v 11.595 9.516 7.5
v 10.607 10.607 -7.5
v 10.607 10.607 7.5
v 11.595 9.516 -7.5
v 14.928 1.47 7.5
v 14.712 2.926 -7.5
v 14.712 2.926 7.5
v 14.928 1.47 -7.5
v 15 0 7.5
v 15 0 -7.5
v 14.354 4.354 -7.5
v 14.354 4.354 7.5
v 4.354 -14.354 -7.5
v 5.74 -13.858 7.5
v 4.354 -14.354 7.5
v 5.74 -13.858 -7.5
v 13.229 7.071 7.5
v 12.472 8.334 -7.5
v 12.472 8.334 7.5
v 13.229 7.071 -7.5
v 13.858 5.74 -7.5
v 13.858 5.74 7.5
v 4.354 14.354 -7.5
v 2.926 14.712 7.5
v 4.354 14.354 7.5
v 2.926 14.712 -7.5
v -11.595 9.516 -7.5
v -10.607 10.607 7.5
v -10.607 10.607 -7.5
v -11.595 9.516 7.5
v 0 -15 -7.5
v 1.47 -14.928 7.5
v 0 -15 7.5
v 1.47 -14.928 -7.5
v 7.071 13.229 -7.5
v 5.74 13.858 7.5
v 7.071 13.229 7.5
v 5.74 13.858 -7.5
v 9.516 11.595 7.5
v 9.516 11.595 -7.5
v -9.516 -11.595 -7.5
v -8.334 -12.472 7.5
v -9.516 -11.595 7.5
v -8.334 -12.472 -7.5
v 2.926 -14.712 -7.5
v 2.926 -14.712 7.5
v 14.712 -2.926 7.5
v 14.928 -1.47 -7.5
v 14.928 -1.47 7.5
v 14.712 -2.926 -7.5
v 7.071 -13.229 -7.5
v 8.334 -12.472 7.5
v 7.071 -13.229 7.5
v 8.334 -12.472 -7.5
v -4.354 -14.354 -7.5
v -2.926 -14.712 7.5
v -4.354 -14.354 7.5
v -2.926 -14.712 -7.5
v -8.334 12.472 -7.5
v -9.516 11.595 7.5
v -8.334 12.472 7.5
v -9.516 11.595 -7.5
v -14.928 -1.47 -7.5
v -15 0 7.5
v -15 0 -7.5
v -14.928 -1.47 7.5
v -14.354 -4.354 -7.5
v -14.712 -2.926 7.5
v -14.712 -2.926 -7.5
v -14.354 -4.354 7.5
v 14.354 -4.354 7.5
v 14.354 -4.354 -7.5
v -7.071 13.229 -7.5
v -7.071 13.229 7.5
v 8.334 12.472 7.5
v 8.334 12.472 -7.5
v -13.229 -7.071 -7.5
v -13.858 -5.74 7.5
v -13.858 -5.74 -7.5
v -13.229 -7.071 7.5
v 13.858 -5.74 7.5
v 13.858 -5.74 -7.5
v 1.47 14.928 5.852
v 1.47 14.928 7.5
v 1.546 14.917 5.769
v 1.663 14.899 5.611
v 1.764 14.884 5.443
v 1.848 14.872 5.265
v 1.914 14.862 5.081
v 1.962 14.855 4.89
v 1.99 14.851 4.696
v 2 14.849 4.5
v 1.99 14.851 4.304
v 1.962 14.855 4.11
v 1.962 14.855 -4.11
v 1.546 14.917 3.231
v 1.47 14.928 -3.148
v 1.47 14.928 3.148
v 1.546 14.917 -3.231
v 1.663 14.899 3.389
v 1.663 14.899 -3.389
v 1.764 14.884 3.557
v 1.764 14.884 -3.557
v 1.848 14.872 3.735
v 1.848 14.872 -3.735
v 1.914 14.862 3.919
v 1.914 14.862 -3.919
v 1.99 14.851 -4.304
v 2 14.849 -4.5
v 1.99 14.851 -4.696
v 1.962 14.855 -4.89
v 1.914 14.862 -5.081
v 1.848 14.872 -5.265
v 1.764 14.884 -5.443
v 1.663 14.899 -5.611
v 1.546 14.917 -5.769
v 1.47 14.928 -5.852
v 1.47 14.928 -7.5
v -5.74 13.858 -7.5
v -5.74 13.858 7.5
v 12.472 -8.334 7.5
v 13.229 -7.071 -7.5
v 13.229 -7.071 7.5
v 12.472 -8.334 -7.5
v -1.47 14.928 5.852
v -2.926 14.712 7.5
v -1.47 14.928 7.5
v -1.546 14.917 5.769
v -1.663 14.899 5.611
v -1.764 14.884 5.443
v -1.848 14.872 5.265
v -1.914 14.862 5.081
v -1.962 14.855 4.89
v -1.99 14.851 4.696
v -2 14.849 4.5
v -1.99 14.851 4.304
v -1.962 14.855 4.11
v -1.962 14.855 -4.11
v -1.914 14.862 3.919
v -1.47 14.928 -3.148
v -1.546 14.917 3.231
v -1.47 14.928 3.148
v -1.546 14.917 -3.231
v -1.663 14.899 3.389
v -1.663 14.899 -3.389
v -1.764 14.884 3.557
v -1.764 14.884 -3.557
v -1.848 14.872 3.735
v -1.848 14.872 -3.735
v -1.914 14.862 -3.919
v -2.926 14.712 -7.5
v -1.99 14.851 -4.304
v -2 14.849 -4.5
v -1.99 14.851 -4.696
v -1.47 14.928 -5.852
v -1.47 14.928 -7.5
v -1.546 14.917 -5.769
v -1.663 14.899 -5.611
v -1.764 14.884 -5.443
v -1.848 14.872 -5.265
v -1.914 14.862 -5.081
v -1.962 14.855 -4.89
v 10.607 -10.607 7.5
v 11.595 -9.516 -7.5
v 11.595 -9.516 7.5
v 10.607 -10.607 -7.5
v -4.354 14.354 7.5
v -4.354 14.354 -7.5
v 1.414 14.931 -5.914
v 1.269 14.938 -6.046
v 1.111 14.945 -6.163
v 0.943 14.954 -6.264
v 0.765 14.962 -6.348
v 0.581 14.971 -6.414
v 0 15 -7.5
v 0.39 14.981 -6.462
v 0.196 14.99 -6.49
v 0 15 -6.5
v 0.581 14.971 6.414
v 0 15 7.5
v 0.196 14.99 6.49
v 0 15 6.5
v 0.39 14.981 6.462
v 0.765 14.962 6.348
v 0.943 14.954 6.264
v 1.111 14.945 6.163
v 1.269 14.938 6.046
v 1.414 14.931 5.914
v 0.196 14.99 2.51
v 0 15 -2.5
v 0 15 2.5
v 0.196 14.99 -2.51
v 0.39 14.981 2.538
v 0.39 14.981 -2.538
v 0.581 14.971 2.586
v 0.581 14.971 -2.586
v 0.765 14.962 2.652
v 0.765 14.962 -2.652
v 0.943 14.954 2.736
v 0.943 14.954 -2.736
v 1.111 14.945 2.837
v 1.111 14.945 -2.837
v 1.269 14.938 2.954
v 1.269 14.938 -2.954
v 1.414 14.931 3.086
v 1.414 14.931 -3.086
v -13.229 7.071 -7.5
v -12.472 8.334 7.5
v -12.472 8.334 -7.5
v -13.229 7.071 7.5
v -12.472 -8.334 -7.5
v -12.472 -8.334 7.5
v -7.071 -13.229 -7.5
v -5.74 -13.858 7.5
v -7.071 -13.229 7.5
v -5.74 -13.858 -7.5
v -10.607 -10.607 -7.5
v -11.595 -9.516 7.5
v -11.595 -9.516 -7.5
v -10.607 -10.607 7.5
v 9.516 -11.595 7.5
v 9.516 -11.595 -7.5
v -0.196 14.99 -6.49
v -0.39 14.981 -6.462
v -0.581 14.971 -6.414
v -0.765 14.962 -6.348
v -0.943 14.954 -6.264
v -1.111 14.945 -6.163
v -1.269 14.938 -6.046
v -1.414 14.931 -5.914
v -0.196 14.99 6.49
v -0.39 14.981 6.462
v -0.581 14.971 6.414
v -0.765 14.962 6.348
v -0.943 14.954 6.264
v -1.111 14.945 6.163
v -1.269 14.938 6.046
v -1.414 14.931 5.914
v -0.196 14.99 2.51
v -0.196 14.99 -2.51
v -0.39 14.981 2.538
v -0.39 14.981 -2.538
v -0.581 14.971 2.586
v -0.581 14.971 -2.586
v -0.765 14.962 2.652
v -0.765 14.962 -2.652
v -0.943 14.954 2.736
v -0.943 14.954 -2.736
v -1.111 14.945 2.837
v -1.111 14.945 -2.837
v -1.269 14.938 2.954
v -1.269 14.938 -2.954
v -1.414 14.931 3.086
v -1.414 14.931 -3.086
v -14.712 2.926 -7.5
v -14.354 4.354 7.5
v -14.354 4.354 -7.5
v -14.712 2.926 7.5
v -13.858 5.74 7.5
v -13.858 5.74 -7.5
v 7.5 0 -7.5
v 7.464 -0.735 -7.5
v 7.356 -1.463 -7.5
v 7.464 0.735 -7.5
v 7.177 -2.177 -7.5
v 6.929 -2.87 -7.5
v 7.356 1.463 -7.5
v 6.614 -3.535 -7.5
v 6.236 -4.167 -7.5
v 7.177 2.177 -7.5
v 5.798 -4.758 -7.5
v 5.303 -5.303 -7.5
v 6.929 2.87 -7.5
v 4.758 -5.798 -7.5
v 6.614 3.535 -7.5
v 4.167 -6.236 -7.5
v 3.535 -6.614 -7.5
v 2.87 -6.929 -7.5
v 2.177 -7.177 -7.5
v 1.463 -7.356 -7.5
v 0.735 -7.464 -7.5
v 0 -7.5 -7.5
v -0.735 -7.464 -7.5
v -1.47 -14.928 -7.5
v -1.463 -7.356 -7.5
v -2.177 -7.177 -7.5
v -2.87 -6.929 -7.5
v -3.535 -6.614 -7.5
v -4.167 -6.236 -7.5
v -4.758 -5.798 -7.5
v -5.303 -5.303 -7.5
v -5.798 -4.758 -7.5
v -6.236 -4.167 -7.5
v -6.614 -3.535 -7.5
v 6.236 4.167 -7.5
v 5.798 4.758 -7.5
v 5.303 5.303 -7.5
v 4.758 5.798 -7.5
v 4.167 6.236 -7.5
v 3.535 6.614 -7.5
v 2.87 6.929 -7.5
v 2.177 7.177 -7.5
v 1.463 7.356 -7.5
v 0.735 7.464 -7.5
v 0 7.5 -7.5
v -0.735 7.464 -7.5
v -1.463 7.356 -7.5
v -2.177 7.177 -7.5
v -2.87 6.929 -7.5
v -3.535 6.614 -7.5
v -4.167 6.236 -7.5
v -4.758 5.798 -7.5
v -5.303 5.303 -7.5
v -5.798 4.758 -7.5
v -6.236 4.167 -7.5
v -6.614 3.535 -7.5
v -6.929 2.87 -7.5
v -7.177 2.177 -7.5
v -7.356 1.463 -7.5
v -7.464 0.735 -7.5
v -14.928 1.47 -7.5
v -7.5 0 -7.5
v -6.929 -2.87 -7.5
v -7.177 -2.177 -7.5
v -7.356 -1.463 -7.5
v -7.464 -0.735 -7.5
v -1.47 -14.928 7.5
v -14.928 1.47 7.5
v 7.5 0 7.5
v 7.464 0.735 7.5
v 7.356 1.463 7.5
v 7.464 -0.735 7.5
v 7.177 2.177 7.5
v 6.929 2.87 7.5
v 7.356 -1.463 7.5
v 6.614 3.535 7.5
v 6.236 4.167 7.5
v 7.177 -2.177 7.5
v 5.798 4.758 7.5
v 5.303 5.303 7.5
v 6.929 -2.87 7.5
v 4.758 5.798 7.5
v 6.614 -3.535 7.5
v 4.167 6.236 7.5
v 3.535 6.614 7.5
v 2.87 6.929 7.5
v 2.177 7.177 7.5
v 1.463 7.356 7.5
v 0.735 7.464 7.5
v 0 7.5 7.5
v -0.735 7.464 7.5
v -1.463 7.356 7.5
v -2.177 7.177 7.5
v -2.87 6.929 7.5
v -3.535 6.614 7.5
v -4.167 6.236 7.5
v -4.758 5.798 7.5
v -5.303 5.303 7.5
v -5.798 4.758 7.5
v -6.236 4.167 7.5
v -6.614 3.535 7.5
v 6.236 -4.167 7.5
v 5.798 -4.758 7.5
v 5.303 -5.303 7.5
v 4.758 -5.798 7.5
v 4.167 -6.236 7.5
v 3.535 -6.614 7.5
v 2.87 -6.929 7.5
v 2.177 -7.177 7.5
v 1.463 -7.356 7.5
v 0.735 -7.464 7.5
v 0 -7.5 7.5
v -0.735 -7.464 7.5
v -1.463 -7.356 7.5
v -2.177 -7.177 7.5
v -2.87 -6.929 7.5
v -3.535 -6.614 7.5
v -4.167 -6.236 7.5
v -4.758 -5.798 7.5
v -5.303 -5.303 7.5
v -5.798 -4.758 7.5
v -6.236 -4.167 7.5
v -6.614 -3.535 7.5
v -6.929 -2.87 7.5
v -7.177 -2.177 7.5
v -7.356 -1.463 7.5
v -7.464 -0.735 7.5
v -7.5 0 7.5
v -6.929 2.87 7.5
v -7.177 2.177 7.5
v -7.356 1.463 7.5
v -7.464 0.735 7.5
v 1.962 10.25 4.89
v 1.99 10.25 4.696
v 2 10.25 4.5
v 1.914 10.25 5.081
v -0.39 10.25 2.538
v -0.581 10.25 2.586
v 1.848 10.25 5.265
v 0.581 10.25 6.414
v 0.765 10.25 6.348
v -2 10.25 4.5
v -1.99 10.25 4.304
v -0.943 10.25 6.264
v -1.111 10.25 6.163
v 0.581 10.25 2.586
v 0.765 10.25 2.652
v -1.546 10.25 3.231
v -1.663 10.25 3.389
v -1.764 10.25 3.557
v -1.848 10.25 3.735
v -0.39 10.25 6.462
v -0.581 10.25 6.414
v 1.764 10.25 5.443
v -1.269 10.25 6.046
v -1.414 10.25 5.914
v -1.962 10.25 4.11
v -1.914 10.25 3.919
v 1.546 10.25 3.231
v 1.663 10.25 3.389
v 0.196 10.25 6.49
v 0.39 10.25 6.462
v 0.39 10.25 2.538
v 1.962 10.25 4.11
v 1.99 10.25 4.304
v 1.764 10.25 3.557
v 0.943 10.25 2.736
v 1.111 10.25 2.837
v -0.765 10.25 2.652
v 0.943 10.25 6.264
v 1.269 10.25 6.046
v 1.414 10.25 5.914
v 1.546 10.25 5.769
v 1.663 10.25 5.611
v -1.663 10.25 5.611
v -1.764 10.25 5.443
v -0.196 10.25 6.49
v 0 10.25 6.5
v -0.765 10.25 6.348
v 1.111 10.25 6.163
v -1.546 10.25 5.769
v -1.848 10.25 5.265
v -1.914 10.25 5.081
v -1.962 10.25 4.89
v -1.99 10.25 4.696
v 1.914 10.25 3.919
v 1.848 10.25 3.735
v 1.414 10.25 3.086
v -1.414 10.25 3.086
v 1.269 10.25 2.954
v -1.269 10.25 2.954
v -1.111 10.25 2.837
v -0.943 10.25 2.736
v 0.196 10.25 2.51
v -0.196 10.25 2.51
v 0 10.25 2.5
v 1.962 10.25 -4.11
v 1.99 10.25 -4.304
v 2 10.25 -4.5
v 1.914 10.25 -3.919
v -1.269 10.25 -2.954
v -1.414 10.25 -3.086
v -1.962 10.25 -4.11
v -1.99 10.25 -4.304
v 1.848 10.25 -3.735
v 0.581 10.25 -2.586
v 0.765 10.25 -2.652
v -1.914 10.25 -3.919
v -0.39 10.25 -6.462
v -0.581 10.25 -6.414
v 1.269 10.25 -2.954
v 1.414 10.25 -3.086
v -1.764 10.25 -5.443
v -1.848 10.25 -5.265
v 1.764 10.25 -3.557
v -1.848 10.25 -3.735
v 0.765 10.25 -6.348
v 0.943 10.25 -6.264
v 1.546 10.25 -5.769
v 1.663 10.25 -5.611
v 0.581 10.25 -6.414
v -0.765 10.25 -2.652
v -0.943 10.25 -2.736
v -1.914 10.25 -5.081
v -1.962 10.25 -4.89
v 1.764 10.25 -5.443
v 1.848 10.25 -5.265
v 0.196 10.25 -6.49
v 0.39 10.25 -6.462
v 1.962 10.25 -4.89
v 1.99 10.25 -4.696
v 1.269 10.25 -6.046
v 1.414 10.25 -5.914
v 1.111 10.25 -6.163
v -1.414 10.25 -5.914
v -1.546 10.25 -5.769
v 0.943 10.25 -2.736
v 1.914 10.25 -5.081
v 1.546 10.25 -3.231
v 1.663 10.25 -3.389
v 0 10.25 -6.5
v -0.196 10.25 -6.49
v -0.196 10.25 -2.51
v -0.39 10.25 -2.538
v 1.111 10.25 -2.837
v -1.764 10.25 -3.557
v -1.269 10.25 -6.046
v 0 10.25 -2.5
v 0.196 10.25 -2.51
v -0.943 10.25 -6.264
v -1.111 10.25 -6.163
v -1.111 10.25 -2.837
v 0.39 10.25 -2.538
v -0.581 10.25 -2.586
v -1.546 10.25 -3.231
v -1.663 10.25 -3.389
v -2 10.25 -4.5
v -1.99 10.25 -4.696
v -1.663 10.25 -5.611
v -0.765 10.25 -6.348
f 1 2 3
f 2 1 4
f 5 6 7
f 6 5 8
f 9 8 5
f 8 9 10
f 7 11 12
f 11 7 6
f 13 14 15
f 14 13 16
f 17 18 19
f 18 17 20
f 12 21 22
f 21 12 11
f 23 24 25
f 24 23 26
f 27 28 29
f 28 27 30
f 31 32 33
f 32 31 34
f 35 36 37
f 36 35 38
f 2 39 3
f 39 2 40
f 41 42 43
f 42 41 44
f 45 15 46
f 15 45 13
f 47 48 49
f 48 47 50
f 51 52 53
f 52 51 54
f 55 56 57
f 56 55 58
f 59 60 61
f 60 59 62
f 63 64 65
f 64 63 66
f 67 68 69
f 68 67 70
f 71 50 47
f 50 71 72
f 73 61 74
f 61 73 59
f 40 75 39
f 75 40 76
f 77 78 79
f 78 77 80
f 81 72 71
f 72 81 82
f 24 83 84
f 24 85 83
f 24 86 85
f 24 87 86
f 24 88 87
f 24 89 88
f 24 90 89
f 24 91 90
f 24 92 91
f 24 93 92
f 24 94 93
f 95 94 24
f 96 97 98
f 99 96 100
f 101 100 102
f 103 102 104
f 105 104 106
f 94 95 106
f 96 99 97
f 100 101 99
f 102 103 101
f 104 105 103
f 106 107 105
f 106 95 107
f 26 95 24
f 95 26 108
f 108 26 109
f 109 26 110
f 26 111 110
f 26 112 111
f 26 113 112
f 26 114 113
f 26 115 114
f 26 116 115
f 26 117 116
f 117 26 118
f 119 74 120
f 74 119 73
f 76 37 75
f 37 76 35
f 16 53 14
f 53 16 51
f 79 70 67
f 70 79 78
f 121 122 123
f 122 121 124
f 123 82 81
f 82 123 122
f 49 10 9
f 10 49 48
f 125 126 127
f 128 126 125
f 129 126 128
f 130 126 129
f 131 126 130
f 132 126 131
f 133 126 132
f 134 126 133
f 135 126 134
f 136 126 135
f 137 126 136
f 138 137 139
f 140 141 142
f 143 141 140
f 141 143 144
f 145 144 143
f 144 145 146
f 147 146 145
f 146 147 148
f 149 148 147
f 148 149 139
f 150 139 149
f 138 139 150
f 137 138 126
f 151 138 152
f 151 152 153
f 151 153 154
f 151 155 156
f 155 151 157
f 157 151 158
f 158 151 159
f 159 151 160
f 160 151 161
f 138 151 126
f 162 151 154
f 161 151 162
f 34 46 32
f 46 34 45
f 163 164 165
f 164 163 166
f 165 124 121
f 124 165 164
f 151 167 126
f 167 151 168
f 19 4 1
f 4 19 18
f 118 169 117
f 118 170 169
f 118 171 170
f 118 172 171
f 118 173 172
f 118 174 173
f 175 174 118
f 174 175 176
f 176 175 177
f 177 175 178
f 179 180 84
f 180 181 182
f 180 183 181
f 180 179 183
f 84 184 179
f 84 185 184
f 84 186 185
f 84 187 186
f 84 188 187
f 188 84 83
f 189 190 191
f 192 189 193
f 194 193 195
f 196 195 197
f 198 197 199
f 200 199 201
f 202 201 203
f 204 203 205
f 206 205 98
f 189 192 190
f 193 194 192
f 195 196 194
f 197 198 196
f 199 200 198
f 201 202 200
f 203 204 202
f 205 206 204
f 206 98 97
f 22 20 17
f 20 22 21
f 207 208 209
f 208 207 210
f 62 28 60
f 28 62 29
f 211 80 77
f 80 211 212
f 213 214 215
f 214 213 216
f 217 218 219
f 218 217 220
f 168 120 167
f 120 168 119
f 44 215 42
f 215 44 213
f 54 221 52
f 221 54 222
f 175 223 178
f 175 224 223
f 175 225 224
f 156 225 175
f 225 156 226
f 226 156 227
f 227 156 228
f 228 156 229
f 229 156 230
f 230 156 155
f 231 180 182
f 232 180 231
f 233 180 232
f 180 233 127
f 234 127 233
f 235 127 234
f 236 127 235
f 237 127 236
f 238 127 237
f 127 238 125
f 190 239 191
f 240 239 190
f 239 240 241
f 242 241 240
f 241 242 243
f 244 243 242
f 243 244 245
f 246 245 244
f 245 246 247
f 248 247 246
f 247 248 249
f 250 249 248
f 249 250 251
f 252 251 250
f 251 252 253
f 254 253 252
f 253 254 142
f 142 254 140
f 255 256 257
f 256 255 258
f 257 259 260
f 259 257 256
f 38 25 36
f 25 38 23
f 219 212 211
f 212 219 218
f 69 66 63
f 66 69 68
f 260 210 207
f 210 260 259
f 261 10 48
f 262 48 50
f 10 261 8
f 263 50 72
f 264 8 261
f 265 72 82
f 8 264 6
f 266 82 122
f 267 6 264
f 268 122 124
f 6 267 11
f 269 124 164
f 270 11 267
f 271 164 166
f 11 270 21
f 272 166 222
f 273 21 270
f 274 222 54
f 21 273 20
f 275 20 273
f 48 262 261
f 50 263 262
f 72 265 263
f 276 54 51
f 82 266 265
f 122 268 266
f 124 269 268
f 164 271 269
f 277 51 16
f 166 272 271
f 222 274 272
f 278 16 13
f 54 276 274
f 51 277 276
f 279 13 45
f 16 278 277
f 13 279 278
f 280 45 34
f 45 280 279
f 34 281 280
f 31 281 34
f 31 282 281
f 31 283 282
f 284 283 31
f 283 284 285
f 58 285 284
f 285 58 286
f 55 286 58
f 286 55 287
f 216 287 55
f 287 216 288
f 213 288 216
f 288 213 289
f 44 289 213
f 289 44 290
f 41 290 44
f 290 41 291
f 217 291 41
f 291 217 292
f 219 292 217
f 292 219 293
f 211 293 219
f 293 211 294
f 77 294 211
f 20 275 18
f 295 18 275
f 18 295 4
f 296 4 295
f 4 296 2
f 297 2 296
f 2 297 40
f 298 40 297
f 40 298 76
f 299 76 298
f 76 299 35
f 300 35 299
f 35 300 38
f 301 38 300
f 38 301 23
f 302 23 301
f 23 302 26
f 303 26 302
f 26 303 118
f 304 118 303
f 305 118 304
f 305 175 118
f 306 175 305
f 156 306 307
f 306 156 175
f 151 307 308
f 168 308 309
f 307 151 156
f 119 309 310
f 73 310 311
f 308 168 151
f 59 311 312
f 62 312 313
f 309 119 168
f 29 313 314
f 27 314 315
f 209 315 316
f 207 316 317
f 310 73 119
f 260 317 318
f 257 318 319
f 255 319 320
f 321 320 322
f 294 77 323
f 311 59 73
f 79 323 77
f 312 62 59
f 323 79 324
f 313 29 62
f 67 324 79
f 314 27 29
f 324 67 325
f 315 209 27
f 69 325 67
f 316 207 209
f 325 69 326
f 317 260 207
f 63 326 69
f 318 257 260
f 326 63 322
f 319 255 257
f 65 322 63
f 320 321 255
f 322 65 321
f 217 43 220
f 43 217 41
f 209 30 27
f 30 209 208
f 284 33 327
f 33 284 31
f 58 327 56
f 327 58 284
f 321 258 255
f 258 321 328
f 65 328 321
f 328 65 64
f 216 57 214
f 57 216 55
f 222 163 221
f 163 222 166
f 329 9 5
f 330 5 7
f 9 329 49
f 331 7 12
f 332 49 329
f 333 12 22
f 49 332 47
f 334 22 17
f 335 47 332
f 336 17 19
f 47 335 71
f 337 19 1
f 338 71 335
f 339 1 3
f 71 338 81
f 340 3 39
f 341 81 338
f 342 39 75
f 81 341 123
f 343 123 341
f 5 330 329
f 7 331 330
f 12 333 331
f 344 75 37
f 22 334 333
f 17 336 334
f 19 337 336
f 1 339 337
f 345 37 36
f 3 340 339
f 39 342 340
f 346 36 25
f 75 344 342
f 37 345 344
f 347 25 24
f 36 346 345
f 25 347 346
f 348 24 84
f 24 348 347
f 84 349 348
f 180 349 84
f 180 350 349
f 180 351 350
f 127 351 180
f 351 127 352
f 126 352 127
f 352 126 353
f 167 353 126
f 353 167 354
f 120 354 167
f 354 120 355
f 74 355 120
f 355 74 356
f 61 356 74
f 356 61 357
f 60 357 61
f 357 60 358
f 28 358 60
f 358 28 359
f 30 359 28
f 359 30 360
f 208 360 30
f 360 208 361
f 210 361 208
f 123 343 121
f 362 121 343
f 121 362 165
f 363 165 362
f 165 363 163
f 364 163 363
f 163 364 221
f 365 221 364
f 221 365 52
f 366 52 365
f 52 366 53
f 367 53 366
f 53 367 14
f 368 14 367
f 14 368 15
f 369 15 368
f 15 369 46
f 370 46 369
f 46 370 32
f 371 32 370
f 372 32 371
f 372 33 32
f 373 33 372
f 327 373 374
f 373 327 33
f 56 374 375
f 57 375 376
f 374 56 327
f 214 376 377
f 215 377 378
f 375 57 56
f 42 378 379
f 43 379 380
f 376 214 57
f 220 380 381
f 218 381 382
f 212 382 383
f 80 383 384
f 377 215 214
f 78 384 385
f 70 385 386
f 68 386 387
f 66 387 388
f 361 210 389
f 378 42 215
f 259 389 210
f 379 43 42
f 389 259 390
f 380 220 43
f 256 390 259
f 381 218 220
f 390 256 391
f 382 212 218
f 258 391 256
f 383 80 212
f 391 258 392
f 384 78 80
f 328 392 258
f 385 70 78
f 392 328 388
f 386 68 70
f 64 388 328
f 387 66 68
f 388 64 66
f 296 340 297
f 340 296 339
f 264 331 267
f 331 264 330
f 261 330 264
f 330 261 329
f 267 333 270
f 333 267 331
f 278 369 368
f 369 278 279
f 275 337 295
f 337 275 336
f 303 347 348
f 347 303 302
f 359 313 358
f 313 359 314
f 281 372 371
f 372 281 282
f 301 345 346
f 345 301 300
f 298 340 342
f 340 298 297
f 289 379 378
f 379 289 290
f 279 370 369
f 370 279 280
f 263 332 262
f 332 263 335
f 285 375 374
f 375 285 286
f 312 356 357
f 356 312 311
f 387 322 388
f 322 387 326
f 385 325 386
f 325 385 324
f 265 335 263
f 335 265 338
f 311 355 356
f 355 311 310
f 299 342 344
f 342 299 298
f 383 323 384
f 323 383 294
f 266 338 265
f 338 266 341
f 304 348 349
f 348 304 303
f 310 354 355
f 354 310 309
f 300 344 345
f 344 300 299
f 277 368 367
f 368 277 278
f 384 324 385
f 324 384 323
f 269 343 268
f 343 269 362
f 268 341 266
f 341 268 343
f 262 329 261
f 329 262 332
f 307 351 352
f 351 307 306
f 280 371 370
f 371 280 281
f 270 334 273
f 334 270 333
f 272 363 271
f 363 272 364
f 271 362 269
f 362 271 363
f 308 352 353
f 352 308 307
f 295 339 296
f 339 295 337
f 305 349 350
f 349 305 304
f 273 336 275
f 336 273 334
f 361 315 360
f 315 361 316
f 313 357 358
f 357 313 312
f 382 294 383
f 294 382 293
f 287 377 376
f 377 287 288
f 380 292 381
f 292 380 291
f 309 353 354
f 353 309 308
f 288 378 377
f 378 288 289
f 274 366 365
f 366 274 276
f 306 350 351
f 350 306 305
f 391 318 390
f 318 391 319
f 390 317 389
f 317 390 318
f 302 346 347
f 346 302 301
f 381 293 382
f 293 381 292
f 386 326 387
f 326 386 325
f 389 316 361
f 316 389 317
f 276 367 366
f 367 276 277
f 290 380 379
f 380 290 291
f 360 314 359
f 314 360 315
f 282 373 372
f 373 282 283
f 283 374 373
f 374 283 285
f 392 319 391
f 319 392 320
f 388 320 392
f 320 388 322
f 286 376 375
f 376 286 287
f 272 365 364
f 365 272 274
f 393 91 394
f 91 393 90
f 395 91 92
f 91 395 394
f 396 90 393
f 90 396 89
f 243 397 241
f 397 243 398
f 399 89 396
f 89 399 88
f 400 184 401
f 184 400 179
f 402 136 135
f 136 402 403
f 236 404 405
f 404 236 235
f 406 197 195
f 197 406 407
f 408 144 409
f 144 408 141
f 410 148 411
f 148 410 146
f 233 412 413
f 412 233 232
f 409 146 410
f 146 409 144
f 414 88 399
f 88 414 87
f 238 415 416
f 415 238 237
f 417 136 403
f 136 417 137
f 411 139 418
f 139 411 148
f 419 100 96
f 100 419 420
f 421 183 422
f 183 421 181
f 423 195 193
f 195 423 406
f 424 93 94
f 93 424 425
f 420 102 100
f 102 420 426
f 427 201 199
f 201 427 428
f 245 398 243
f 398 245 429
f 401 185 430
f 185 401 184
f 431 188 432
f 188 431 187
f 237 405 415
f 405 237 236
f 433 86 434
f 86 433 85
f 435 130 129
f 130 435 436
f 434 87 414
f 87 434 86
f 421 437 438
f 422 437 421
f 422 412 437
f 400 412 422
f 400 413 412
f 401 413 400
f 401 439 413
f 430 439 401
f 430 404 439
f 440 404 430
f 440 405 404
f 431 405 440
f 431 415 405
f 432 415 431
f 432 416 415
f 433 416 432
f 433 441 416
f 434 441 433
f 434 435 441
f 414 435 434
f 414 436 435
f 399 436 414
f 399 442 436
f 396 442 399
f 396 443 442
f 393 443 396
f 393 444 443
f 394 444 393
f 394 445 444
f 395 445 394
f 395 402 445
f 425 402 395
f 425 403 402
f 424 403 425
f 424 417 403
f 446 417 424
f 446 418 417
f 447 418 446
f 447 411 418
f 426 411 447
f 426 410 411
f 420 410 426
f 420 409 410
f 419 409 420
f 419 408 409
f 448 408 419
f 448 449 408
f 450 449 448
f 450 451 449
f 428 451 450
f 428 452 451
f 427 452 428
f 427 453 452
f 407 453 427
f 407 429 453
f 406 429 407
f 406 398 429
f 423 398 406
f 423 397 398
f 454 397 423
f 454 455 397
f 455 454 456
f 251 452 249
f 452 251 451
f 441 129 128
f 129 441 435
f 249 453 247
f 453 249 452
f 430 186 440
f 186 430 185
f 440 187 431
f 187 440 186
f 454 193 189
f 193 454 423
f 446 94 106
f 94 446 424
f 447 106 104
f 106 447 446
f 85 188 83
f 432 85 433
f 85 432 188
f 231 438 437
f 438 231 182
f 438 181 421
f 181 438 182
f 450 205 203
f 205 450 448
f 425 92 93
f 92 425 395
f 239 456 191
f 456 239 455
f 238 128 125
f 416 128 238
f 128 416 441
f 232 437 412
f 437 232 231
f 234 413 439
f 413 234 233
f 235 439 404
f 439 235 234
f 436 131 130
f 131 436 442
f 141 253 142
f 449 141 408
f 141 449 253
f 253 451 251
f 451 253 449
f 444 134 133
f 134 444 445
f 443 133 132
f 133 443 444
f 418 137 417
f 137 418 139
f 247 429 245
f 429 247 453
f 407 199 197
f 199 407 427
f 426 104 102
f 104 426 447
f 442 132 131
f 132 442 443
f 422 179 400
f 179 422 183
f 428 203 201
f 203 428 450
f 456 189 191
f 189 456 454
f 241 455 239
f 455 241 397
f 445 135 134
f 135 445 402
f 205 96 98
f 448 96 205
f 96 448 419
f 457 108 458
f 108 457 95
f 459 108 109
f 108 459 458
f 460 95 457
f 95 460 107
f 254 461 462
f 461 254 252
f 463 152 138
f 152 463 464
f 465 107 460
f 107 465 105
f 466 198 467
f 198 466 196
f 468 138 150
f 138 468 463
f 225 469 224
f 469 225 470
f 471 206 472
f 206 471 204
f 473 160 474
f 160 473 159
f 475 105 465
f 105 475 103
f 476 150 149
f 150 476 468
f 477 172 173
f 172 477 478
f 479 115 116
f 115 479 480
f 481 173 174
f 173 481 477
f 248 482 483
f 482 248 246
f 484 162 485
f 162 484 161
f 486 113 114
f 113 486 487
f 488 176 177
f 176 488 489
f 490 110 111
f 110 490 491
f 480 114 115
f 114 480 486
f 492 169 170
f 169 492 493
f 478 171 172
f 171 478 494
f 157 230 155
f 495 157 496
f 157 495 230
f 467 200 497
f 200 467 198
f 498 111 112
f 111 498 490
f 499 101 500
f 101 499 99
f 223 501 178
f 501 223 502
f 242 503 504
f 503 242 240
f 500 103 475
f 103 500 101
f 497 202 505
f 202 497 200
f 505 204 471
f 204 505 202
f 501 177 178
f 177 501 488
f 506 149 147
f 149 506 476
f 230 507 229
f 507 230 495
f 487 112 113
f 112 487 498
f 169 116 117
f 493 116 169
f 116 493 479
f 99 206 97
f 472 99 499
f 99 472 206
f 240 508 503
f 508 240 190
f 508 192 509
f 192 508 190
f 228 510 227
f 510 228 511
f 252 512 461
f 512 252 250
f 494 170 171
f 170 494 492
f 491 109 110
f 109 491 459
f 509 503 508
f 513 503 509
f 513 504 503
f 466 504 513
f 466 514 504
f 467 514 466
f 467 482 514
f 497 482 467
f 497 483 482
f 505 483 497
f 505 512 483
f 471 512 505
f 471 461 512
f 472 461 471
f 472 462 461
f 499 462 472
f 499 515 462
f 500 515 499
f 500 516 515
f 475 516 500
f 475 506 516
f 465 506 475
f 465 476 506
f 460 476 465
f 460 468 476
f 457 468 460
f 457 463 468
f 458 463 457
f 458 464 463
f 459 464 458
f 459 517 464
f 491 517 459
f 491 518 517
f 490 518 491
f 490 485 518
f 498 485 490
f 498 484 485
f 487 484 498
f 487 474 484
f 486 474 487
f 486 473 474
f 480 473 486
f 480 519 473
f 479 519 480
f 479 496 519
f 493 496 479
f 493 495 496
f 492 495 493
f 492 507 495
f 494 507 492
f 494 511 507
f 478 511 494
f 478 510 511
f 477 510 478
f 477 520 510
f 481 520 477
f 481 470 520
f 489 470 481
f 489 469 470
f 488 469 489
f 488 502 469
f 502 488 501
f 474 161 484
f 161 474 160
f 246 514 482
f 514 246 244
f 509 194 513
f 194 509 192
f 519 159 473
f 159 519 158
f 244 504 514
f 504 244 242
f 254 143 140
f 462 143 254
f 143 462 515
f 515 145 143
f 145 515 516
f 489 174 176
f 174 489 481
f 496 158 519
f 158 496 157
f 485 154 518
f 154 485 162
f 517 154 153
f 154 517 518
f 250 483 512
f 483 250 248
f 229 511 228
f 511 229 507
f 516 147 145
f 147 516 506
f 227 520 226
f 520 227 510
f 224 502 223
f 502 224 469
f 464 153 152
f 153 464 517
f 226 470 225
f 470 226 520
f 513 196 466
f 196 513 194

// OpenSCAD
// COBRA Vertebra - C6 V5
// Height: 15.0mm, OD: 30.0mm

$fn = 64;

difference() {
    // Outer cylinder
    cylinder(h=15.0, d=30.0, center=true);
    
    // Inner channel
    cylinder(h=17.0, d=15.0, center=true);

    // Pivot holes
    translate([0, 15.0, 4.5])
    rotate([90, 0, 0])
    cylinder(h=9.5, d=4, center=true);
    
    translate([0, 15.0, -4.5])
    rotate([90, 0, 0])
    cylinder(h=9.5, d=4, center=true);
}
